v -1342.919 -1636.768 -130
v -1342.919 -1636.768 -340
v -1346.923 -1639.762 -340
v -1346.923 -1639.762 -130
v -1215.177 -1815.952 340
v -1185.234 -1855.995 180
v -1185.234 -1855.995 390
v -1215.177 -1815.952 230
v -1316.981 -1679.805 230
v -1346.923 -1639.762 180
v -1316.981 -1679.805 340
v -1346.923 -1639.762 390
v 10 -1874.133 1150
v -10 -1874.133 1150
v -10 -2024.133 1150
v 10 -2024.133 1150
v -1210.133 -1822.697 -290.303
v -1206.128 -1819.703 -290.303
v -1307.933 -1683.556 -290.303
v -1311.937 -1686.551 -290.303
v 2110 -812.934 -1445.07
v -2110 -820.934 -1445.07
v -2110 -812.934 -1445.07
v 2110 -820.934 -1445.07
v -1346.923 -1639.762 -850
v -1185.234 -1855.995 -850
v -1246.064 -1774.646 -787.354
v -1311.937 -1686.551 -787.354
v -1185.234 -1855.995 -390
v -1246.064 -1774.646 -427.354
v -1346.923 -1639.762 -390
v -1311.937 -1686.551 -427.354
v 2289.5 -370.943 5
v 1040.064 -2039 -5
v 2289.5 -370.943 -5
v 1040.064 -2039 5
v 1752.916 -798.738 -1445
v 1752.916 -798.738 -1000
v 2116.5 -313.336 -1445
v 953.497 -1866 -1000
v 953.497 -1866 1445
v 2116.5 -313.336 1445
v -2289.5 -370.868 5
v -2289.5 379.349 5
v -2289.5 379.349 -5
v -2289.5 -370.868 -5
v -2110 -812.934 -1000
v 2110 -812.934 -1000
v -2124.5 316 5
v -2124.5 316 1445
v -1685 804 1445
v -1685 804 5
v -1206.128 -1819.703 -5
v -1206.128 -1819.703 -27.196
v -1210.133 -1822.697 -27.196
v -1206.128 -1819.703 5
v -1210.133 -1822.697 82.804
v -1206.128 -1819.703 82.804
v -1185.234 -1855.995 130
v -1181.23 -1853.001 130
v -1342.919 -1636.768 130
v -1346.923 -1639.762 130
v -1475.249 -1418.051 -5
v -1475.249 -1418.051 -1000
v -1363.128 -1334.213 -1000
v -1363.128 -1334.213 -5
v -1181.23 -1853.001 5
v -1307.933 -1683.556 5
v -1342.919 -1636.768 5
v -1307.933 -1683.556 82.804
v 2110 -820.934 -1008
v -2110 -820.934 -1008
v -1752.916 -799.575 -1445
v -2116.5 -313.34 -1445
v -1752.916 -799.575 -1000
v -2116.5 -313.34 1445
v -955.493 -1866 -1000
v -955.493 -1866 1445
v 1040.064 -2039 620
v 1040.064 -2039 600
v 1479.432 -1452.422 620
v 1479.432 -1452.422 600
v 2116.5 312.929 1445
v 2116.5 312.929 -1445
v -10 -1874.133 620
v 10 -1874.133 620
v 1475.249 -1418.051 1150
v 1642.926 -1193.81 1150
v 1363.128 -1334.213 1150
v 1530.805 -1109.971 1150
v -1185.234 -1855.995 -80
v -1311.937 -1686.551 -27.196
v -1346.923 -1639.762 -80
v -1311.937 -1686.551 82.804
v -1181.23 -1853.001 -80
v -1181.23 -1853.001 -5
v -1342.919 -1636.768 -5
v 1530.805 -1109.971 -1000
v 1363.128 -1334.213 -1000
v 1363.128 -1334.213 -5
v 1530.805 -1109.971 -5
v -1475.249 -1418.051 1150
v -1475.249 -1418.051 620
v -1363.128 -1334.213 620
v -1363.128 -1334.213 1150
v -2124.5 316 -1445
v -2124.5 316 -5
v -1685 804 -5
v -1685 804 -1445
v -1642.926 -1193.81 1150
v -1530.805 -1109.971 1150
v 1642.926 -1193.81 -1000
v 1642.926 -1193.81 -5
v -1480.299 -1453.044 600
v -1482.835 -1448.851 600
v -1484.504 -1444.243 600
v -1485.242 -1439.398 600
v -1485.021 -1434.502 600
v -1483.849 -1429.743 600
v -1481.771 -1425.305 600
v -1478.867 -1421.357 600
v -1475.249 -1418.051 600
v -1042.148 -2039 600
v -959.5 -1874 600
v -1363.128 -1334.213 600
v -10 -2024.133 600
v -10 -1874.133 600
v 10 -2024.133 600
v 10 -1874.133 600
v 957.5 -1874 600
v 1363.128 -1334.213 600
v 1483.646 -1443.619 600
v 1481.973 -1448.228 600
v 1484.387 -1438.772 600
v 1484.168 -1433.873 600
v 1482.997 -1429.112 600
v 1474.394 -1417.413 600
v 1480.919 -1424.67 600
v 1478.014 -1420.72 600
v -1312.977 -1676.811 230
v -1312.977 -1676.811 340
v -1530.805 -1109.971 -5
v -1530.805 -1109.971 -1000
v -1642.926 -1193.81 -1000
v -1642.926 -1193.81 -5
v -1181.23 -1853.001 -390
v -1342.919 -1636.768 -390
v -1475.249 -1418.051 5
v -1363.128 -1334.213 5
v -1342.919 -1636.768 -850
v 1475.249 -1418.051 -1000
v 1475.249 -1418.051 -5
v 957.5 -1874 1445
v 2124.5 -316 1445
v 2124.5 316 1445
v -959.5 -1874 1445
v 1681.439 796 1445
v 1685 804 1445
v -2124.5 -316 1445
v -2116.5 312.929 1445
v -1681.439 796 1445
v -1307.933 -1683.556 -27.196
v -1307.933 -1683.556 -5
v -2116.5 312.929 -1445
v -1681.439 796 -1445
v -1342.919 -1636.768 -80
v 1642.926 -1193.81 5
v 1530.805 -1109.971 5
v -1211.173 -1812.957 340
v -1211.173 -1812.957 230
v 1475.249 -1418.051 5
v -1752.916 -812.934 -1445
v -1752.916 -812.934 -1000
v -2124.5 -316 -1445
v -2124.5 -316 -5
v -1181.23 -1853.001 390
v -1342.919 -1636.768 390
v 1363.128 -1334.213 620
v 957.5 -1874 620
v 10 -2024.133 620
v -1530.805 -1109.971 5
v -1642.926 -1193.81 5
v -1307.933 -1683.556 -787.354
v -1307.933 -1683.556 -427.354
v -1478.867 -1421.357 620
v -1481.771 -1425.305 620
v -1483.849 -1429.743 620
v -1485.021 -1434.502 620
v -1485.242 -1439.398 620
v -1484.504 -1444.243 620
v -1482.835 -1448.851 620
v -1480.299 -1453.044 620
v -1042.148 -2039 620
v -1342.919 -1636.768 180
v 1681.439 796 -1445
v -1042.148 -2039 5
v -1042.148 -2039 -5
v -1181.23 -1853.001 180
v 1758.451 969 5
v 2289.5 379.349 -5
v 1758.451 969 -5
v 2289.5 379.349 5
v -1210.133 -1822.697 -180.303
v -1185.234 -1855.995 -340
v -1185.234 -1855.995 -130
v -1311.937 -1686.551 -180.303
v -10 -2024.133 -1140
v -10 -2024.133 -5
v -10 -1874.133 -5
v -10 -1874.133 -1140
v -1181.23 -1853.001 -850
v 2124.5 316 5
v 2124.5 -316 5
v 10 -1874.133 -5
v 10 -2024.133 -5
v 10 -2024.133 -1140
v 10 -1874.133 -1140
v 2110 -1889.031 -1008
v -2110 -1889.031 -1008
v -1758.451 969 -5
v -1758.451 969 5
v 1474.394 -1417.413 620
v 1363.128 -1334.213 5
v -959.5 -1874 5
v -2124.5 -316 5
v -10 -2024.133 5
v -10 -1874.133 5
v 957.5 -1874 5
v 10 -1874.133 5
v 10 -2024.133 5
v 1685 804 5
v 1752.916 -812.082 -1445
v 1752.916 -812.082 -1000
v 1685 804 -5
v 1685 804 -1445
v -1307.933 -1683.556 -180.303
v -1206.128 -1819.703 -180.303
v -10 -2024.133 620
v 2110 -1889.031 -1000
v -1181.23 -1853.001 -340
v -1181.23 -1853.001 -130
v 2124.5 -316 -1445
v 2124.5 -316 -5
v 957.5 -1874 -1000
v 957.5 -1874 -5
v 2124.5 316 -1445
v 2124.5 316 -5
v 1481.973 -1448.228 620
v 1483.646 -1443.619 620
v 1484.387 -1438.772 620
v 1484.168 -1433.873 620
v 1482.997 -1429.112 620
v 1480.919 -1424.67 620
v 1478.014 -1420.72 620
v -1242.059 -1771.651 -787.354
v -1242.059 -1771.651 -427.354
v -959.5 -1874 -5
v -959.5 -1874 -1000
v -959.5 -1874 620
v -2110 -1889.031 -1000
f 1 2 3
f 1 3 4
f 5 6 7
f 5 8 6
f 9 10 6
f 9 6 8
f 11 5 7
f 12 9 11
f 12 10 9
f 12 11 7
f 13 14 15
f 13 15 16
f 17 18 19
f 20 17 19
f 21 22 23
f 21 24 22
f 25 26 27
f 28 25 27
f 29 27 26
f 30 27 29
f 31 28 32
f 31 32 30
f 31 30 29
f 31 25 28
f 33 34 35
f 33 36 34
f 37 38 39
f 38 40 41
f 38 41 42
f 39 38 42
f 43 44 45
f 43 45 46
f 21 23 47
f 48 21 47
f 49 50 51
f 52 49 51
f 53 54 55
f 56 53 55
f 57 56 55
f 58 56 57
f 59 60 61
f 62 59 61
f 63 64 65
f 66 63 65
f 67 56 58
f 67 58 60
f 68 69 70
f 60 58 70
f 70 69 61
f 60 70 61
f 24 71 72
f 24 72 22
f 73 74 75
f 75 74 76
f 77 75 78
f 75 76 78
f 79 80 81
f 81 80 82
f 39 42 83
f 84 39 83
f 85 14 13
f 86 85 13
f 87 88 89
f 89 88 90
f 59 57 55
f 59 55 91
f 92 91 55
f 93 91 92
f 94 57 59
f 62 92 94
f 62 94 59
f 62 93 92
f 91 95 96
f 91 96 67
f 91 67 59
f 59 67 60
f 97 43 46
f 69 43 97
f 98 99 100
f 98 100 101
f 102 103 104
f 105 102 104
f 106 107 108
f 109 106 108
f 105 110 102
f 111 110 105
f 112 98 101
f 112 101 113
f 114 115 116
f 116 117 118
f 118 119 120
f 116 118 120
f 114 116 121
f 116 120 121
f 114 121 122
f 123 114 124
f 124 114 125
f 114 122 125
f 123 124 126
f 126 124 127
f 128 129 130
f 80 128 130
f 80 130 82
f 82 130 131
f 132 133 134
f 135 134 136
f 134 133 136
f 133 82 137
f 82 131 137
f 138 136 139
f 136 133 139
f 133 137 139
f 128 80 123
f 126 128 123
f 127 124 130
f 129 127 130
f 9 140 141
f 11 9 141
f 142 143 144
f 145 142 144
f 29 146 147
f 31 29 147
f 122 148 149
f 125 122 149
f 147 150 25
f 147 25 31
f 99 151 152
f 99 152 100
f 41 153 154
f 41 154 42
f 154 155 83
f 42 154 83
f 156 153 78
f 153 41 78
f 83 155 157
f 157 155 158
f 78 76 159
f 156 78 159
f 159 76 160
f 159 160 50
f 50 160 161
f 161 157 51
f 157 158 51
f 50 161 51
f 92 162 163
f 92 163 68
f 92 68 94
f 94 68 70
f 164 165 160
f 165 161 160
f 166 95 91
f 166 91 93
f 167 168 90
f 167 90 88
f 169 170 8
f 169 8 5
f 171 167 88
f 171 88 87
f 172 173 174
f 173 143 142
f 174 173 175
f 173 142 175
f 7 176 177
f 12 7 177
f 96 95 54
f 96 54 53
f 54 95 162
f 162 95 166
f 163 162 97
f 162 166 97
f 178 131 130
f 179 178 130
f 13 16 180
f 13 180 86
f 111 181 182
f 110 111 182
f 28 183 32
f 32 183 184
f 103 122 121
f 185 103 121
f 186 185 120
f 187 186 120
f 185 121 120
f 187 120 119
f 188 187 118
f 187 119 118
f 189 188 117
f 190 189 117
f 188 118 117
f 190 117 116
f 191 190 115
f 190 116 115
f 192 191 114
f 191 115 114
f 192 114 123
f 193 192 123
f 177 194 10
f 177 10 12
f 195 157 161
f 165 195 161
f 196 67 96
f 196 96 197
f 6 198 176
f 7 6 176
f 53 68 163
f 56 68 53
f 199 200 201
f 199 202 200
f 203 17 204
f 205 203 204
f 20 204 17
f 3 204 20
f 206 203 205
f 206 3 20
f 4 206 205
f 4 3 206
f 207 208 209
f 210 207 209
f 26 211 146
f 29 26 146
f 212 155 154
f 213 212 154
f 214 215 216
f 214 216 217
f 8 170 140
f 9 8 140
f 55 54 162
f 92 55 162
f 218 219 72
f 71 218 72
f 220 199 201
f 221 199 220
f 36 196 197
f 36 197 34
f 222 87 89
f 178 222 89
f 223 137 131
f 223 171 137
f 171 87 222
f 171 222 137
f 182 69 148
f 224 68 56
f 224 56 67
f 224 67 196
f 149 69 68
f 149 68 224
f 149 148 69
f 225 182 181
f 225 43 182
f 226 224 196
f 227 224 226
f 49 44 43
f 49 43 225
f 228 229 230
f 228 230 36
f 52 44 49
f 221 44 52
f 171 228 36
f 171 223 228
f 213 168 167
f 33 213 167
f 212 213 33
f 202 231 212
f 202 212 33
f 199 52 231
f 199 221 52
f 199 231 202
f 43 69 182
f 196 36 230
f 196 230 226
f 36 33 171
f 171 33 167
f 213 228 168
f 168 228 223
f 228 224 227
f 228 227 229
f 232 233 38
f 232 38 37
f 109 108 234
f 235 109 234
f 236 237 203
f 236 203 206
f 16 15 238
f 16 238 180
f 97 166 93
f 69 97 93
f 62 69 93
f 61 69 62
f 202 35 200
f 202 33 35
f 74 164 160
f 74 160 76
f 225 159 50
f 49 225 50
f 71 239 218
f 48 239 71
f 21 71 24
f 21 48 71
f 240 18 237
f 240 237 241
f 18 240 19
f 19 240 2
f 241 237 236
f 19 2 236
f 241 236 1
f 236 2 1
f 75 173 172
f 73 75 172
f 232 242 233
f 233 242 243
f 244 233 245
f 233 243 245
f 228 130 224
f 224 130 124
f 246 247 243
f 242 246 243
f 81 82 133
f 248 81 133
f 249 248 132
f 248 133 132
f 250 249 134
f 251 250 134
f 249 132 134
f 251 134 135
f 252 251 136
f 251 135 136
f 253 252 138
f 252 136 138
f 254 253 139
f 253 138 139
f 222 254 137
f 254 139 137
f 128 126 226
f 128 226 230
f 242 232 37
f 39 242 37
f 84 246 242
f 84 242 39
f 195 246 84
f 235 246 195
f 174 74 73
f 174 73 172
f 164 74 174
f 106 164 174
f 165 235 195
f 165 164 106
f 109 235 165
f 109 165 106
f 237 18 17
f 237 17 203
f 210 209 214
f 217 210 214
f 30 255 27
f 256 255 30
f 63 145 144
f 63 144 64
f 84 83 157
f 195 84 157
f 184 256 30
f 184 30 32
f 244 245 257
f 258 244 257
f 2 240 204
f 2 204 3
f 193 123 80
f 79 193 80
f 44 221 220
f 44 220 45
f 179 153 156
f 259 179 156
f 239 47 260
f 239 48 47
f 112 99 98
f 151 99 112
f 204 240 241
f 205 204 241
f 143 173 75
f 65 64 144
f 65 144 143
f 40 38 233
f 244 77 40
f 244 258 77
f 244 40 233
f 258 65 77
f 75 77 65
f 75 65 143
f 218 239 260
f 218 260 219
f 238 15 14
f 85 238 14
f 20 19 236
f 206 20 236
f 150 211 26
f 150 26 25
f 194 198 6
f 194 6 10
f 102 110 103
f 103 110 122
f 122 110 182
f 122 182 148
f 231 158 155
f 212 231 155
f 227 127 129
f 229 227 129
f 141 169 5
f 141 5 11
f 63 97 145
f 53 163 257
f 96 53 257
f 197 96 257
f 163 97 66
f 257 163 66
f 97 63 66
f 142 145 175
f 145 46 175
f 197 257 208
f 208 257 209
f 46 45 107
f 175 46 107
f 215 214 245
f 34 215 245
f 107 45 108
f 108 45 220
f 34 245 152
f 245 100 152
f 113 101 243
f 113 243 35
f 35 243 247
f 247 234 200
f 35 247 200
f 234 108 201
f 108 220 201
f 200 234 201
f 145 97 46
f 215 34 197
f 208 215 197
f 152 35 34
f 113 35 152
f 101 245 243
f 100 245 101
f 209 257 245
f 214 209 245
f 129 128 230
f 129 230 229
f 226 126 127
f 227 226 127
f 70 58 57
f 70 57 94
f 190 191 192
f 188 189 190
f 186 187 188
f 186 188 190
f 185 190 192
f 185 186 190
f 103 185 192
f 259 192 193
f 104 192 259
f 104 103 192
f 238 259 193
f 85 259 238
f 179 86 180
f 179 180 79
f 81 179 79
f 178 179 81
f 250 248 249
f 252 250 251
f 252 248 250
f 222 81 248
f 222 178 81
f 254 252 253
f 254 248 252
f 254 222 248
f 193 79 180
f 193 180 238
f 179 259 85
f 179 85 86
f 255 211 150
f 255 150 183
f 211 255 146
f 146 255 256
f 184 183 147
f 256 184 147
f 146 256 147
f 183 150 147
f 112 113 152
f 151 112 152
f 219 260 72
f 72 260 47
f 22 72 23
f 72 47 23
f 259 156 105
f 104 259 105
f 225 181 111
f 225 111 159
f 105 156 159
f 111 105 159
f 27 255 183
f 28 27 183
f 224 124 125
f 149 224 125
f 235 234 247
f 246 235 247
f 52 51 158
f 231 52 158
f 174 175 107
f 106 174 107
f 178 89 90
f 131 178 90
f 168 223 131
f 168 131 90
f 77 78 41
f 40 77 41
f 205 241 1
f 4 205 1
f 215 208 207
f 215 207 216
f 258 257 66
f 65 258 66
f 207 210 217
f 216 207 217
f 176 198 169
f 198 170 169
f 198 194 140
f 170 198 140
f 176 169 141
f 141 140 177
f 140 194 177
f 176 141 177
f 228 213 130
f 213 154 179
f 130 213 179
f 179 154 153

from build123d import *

# Parameters (mm, degrees)
BOSS_EXTRUDE1_DEPTH  = 1445
BOSS_EXTRUDE2_DEPTH  = 5
SKETCH4_W            = 20
SKETCH4_H            = 150
BOSS_EXTRUDE4_DEPTH  = 1145
BOSS_EXTRUDE9_START  = 600
BOSS_EXTRUDE9_DEPTH  = 20
CUT_EXTRUDE1_START   = -1874
SKETCH6_W            = 3505.832056238
SKETCH6_H            = 1215.707549371
CUT_EXTRUDE1_DEPTH   = 1075.262189
BOSS_EXTRUDE11_DEPTH = 2110
SKETCH8_W            = 210
SKETCH8_H            = 270
SKETCH8_W_2          = 110
SKETCH8_H_2          = 170
SKETCH8_W_3          = 460
SKETCH8_W_4          = 360
SKETCH8_H_3          = 110
BOSS_EXTRUDE12_DEPTH = 5


with BuildPart() as part:
    # Sketch1 → Boss-Extrude1 (new, symmetric)
    with BuildSketch(Plane.XY):
        Polygon((-1685, 804), (1685, 804), (2124.5, 316), (2124.5, -316), (957.5, -1874), (-959.5, -1874), (-2124.5, -316), (-2124.5, 316), align=None)
        Polygon((-1681.438728184, 796), (-2116.5, 312.928553706), (-2116.5, -313.339728652), (-955.49280095, -1866), (953.496917228, -1866), (2116.5, -313.336072871), (2116.5, 312.928553706), (1681.438728184, 796), align=None, mode=Mode.SUBTRACT)
    extrude(amount=BOSS_EXTRUDE1_DEPTH, both=True)

    # Sketch1<4> → Boss-Extrude2 (add, symmetric)
    with BuildSketch(Plane.XY):
        Polygon((1758.451231204, 969), (-1758.451231204, 969), (-2289.5, 379.348579813), (-2289.5, -370.868096546), (-1042.148480408, -2039), (1040.063582176, -2039), (2289.5, -370.943497026), (2289.5, 379.348579813), align=None)
        Polygon((-2124.5, 316), (-1685, 804), (1685, 804), (2124.5, 316), (2124.5, -316), (957.5, -1874), (-959.5, -1874), (-1363.127826452, -1334.21274368), (-1475.248610905, -1418.051456061), (-1642.926035666, -1193.809887154), (-1530.805251212, -1109.971174774), (-2124.5, -316), align=None, mode=Mode.SUBTRACT)
    extrude(amount=BOSS_EXTRUDE2_DEPTH, both=True)

    # Sketch4 → Boss-Extrude4 (add, symmetric)
    with BuildSketch(Plane.XY.offset(5)):
        Polygon((-1642.926035666, -1193.809887154), (-1475.248610905, -1418.051456061), (-1363.127826452, -1334.21274368), (-1530.805251212, -1109.971174774), align=None)
        Polygon((1475.248610905, -1418.051456061), (1363.127826452, -1334.21274368), (1530.805251212, -1109.971174774), (1642.926035666, -1193.809887154), align=None)
        with Locations((0, -1949.133011303)):
            Rectangle(SKETCH4_W, SKETCH4_H)
    extrude(amount=BOSS_EXTRUDE4_DEPTH, both=True)

    # Sketch5 → Boss-Extrude9 (add)
    with BuildSketch(Plane.XY.offset(BOSS_EXTRUDE9_START)):
        with BuildLine():
            Line((-1363.127826452, -1334.21274368), (-1475.248610905, -1418.051456061))
            ThreePointArc((-1475.248610905, -1418.051456061), (-1485.021035311, -1434.501873829), (-1480.298980919, -1453.044223352))
            Line((-1480.298980919, -1453.044223352), (-1042.148480408, -2039))
            Line((-1042.148480408, -2039), (1040.063582176, -2039))
            Line((1040.063582176, -2039), (1479.432400385, -1452.421920505))
            ThreePointArc((1479.432400385, -1452.421920505), (1484.168247474, -1433.873281887), (1474.394355934, -1417.41268389))
            Line((1474.394355934, -1417.41268389), (1363.127826452, -1334.21274368))
            Line((1363.127826452, -1334.21274368), (957.5, -1874))
            Line((957.5, -1874), (-959.5, -1874))
            Line((-959.5, -1874), (-1363.127826452, -1334.21274368))
        make_face()
    extrude(amount=BOSS_EXTRUDE9_DEPTH)

    # Sketch6 → Cut-Extrude1 (cut)
    with BuildSketch(Plane(origin=(0, 0, 0), x_dir=(1, 0, 0), z_dir=(0, 1, 0)).offset(CUT_EXTRUDE1_START)):
        with Locations((0, 1607.853774685)):
            Rectangle(SKETCH6_W, SKETCH6_H)
    extrude(amount=CUT_EXTRUDE1_DEPTH, mode=Mode.SUBTRACT)

    # Sketch8 → Boss-Extrude12 (add)
    # profile 1 of 4: a face of its own
    with BuildSketch(Plane(origin=(-1646.308604184, -1231.033070522, 0), x_dir=(0, 0, 1), z_dir=(-0.8008627460957028, -0.5988479455722043, 0))):
        with Locations((25, -641.621893436)):
            Rectangle(SKETCH8_W, SKETCH8_H)
        with Locations((27.803968445, -650.044864995)):
            Rectangle(SKETCH8_W_2, SKETCH8_H_2, mode=Mode.SUBTRACT)
    # profile 2 of 4: a face of its own
    with BuildSketch(Plane(origin=(-1646.308604184, -1231.033070522, 0), x_dir=(0, 0, 1), z_dir=(-0.8008627460957028, -0.5988479455722043, 0))):
        with Locations((285, -641.621893436)):
            Rectangle(SKETCH8_W, SKETCH8_H)
        with Locations((285, -641.621893436)):
            Rectangle(SKETCH8_W_2, SKETCH8_H_2, mode=Mode.SUBTRACT)
    # profile 3 of 4: a face of its own
    with BuildSketch(Plane(origin=(-1646.308604184, -1231.033070522, 0), x_dir=(0, 0, 1), z_dir=(-0.8008627460957028, -0.5988479455722043, 0))):
        with Locations((-235, -641.621893436)):
            Rectangle(SKETCH8_W, SKETCH8_H)
        with Locations((-235.303383431, -650.044864995)):
            Rectangle(SKETCH8_W_2, SKETCH8_H_2, mode=Mode.SUBTRACT)
    # profile 4 of 4: a face of its own
    with BuildSketch(Plane(origin=(-1646.308604184, -1231.033070522, 0), x_dir=(0, 0, 1), z_dir=(-0.8008627460957028, -0.5988479455722043, 0))):
        with Locations((-620, -641.621893436)):
            Rectangle(SKETCH8_W_3, SKETCH8_H)
        with Locations((-607.35413734, -620.044864995)):
            Rectangle(SKETCH8_W_4, SKETCH8_H_3, mode=Mode.SUBTRACT)
    extrude(amount=BOSS_EXTRUDE12_DEPTH)


with BuildPart() as body_2:
    # Sketch7 → Boss-Extrude11 (new, symmetric)
    with BuildSketch(Plane(origin=(0, 0, 0), x_dir=(0, 0, -1), z_dir=(1, 0, 0))):
        Polygon((1000, -812.933758103), (1000, -1889.031457311), (1008, -1889.031457311), (1008, -820.933758103), (1445.070039038, -820.933758103), (1445.070039038, -812.933758103), align=None)
    extrude(amount=BOSS_EXTRUDE11_DEPTH, both=True)


with BuildPart() as boss_extrude12_piece_1:
    # of the separate pieces the step leaves, piece 1, a body of its own (boss_extrude12_pieces)
    add(part.part.solids().sort_by_distance((-1685, 804, -1445))[0])


with BuildPart() as boss_extrude12_piece_2:
    # of the separate pieces the step leaves, piece 2, a body of its own (boss_extrude12_pieces)
    add(part.part.solids().sort_by_distance((-1342.919124117, -1636.767671332, -390))[0])


with BuildPart() as boss_extrude12_piece_3:
    # of the separate pieces the step leaves, piece 3, a body of its own (boss_extrude12_pieces)
    add(part.part.solids().sort_by_distance((-1342.919124117, -1636.767671332, 180))[0])


with BuildPart() as boss_extrude12_piece_4:
    # of the separate pieces the step leaves, piece 4, a body of its own (boss_extrude12_pieces)
    add(part.part.solids().sort_by_distance((-1342.919124117, -1636.767671332, -130))[0])


solid = Compound([body_2.part, boss_extrude12_piece_1.part, boss_extrude12_piece_2.part, boss_extrude12_piece_3.part, boss_extrude12_piece_4.part])
